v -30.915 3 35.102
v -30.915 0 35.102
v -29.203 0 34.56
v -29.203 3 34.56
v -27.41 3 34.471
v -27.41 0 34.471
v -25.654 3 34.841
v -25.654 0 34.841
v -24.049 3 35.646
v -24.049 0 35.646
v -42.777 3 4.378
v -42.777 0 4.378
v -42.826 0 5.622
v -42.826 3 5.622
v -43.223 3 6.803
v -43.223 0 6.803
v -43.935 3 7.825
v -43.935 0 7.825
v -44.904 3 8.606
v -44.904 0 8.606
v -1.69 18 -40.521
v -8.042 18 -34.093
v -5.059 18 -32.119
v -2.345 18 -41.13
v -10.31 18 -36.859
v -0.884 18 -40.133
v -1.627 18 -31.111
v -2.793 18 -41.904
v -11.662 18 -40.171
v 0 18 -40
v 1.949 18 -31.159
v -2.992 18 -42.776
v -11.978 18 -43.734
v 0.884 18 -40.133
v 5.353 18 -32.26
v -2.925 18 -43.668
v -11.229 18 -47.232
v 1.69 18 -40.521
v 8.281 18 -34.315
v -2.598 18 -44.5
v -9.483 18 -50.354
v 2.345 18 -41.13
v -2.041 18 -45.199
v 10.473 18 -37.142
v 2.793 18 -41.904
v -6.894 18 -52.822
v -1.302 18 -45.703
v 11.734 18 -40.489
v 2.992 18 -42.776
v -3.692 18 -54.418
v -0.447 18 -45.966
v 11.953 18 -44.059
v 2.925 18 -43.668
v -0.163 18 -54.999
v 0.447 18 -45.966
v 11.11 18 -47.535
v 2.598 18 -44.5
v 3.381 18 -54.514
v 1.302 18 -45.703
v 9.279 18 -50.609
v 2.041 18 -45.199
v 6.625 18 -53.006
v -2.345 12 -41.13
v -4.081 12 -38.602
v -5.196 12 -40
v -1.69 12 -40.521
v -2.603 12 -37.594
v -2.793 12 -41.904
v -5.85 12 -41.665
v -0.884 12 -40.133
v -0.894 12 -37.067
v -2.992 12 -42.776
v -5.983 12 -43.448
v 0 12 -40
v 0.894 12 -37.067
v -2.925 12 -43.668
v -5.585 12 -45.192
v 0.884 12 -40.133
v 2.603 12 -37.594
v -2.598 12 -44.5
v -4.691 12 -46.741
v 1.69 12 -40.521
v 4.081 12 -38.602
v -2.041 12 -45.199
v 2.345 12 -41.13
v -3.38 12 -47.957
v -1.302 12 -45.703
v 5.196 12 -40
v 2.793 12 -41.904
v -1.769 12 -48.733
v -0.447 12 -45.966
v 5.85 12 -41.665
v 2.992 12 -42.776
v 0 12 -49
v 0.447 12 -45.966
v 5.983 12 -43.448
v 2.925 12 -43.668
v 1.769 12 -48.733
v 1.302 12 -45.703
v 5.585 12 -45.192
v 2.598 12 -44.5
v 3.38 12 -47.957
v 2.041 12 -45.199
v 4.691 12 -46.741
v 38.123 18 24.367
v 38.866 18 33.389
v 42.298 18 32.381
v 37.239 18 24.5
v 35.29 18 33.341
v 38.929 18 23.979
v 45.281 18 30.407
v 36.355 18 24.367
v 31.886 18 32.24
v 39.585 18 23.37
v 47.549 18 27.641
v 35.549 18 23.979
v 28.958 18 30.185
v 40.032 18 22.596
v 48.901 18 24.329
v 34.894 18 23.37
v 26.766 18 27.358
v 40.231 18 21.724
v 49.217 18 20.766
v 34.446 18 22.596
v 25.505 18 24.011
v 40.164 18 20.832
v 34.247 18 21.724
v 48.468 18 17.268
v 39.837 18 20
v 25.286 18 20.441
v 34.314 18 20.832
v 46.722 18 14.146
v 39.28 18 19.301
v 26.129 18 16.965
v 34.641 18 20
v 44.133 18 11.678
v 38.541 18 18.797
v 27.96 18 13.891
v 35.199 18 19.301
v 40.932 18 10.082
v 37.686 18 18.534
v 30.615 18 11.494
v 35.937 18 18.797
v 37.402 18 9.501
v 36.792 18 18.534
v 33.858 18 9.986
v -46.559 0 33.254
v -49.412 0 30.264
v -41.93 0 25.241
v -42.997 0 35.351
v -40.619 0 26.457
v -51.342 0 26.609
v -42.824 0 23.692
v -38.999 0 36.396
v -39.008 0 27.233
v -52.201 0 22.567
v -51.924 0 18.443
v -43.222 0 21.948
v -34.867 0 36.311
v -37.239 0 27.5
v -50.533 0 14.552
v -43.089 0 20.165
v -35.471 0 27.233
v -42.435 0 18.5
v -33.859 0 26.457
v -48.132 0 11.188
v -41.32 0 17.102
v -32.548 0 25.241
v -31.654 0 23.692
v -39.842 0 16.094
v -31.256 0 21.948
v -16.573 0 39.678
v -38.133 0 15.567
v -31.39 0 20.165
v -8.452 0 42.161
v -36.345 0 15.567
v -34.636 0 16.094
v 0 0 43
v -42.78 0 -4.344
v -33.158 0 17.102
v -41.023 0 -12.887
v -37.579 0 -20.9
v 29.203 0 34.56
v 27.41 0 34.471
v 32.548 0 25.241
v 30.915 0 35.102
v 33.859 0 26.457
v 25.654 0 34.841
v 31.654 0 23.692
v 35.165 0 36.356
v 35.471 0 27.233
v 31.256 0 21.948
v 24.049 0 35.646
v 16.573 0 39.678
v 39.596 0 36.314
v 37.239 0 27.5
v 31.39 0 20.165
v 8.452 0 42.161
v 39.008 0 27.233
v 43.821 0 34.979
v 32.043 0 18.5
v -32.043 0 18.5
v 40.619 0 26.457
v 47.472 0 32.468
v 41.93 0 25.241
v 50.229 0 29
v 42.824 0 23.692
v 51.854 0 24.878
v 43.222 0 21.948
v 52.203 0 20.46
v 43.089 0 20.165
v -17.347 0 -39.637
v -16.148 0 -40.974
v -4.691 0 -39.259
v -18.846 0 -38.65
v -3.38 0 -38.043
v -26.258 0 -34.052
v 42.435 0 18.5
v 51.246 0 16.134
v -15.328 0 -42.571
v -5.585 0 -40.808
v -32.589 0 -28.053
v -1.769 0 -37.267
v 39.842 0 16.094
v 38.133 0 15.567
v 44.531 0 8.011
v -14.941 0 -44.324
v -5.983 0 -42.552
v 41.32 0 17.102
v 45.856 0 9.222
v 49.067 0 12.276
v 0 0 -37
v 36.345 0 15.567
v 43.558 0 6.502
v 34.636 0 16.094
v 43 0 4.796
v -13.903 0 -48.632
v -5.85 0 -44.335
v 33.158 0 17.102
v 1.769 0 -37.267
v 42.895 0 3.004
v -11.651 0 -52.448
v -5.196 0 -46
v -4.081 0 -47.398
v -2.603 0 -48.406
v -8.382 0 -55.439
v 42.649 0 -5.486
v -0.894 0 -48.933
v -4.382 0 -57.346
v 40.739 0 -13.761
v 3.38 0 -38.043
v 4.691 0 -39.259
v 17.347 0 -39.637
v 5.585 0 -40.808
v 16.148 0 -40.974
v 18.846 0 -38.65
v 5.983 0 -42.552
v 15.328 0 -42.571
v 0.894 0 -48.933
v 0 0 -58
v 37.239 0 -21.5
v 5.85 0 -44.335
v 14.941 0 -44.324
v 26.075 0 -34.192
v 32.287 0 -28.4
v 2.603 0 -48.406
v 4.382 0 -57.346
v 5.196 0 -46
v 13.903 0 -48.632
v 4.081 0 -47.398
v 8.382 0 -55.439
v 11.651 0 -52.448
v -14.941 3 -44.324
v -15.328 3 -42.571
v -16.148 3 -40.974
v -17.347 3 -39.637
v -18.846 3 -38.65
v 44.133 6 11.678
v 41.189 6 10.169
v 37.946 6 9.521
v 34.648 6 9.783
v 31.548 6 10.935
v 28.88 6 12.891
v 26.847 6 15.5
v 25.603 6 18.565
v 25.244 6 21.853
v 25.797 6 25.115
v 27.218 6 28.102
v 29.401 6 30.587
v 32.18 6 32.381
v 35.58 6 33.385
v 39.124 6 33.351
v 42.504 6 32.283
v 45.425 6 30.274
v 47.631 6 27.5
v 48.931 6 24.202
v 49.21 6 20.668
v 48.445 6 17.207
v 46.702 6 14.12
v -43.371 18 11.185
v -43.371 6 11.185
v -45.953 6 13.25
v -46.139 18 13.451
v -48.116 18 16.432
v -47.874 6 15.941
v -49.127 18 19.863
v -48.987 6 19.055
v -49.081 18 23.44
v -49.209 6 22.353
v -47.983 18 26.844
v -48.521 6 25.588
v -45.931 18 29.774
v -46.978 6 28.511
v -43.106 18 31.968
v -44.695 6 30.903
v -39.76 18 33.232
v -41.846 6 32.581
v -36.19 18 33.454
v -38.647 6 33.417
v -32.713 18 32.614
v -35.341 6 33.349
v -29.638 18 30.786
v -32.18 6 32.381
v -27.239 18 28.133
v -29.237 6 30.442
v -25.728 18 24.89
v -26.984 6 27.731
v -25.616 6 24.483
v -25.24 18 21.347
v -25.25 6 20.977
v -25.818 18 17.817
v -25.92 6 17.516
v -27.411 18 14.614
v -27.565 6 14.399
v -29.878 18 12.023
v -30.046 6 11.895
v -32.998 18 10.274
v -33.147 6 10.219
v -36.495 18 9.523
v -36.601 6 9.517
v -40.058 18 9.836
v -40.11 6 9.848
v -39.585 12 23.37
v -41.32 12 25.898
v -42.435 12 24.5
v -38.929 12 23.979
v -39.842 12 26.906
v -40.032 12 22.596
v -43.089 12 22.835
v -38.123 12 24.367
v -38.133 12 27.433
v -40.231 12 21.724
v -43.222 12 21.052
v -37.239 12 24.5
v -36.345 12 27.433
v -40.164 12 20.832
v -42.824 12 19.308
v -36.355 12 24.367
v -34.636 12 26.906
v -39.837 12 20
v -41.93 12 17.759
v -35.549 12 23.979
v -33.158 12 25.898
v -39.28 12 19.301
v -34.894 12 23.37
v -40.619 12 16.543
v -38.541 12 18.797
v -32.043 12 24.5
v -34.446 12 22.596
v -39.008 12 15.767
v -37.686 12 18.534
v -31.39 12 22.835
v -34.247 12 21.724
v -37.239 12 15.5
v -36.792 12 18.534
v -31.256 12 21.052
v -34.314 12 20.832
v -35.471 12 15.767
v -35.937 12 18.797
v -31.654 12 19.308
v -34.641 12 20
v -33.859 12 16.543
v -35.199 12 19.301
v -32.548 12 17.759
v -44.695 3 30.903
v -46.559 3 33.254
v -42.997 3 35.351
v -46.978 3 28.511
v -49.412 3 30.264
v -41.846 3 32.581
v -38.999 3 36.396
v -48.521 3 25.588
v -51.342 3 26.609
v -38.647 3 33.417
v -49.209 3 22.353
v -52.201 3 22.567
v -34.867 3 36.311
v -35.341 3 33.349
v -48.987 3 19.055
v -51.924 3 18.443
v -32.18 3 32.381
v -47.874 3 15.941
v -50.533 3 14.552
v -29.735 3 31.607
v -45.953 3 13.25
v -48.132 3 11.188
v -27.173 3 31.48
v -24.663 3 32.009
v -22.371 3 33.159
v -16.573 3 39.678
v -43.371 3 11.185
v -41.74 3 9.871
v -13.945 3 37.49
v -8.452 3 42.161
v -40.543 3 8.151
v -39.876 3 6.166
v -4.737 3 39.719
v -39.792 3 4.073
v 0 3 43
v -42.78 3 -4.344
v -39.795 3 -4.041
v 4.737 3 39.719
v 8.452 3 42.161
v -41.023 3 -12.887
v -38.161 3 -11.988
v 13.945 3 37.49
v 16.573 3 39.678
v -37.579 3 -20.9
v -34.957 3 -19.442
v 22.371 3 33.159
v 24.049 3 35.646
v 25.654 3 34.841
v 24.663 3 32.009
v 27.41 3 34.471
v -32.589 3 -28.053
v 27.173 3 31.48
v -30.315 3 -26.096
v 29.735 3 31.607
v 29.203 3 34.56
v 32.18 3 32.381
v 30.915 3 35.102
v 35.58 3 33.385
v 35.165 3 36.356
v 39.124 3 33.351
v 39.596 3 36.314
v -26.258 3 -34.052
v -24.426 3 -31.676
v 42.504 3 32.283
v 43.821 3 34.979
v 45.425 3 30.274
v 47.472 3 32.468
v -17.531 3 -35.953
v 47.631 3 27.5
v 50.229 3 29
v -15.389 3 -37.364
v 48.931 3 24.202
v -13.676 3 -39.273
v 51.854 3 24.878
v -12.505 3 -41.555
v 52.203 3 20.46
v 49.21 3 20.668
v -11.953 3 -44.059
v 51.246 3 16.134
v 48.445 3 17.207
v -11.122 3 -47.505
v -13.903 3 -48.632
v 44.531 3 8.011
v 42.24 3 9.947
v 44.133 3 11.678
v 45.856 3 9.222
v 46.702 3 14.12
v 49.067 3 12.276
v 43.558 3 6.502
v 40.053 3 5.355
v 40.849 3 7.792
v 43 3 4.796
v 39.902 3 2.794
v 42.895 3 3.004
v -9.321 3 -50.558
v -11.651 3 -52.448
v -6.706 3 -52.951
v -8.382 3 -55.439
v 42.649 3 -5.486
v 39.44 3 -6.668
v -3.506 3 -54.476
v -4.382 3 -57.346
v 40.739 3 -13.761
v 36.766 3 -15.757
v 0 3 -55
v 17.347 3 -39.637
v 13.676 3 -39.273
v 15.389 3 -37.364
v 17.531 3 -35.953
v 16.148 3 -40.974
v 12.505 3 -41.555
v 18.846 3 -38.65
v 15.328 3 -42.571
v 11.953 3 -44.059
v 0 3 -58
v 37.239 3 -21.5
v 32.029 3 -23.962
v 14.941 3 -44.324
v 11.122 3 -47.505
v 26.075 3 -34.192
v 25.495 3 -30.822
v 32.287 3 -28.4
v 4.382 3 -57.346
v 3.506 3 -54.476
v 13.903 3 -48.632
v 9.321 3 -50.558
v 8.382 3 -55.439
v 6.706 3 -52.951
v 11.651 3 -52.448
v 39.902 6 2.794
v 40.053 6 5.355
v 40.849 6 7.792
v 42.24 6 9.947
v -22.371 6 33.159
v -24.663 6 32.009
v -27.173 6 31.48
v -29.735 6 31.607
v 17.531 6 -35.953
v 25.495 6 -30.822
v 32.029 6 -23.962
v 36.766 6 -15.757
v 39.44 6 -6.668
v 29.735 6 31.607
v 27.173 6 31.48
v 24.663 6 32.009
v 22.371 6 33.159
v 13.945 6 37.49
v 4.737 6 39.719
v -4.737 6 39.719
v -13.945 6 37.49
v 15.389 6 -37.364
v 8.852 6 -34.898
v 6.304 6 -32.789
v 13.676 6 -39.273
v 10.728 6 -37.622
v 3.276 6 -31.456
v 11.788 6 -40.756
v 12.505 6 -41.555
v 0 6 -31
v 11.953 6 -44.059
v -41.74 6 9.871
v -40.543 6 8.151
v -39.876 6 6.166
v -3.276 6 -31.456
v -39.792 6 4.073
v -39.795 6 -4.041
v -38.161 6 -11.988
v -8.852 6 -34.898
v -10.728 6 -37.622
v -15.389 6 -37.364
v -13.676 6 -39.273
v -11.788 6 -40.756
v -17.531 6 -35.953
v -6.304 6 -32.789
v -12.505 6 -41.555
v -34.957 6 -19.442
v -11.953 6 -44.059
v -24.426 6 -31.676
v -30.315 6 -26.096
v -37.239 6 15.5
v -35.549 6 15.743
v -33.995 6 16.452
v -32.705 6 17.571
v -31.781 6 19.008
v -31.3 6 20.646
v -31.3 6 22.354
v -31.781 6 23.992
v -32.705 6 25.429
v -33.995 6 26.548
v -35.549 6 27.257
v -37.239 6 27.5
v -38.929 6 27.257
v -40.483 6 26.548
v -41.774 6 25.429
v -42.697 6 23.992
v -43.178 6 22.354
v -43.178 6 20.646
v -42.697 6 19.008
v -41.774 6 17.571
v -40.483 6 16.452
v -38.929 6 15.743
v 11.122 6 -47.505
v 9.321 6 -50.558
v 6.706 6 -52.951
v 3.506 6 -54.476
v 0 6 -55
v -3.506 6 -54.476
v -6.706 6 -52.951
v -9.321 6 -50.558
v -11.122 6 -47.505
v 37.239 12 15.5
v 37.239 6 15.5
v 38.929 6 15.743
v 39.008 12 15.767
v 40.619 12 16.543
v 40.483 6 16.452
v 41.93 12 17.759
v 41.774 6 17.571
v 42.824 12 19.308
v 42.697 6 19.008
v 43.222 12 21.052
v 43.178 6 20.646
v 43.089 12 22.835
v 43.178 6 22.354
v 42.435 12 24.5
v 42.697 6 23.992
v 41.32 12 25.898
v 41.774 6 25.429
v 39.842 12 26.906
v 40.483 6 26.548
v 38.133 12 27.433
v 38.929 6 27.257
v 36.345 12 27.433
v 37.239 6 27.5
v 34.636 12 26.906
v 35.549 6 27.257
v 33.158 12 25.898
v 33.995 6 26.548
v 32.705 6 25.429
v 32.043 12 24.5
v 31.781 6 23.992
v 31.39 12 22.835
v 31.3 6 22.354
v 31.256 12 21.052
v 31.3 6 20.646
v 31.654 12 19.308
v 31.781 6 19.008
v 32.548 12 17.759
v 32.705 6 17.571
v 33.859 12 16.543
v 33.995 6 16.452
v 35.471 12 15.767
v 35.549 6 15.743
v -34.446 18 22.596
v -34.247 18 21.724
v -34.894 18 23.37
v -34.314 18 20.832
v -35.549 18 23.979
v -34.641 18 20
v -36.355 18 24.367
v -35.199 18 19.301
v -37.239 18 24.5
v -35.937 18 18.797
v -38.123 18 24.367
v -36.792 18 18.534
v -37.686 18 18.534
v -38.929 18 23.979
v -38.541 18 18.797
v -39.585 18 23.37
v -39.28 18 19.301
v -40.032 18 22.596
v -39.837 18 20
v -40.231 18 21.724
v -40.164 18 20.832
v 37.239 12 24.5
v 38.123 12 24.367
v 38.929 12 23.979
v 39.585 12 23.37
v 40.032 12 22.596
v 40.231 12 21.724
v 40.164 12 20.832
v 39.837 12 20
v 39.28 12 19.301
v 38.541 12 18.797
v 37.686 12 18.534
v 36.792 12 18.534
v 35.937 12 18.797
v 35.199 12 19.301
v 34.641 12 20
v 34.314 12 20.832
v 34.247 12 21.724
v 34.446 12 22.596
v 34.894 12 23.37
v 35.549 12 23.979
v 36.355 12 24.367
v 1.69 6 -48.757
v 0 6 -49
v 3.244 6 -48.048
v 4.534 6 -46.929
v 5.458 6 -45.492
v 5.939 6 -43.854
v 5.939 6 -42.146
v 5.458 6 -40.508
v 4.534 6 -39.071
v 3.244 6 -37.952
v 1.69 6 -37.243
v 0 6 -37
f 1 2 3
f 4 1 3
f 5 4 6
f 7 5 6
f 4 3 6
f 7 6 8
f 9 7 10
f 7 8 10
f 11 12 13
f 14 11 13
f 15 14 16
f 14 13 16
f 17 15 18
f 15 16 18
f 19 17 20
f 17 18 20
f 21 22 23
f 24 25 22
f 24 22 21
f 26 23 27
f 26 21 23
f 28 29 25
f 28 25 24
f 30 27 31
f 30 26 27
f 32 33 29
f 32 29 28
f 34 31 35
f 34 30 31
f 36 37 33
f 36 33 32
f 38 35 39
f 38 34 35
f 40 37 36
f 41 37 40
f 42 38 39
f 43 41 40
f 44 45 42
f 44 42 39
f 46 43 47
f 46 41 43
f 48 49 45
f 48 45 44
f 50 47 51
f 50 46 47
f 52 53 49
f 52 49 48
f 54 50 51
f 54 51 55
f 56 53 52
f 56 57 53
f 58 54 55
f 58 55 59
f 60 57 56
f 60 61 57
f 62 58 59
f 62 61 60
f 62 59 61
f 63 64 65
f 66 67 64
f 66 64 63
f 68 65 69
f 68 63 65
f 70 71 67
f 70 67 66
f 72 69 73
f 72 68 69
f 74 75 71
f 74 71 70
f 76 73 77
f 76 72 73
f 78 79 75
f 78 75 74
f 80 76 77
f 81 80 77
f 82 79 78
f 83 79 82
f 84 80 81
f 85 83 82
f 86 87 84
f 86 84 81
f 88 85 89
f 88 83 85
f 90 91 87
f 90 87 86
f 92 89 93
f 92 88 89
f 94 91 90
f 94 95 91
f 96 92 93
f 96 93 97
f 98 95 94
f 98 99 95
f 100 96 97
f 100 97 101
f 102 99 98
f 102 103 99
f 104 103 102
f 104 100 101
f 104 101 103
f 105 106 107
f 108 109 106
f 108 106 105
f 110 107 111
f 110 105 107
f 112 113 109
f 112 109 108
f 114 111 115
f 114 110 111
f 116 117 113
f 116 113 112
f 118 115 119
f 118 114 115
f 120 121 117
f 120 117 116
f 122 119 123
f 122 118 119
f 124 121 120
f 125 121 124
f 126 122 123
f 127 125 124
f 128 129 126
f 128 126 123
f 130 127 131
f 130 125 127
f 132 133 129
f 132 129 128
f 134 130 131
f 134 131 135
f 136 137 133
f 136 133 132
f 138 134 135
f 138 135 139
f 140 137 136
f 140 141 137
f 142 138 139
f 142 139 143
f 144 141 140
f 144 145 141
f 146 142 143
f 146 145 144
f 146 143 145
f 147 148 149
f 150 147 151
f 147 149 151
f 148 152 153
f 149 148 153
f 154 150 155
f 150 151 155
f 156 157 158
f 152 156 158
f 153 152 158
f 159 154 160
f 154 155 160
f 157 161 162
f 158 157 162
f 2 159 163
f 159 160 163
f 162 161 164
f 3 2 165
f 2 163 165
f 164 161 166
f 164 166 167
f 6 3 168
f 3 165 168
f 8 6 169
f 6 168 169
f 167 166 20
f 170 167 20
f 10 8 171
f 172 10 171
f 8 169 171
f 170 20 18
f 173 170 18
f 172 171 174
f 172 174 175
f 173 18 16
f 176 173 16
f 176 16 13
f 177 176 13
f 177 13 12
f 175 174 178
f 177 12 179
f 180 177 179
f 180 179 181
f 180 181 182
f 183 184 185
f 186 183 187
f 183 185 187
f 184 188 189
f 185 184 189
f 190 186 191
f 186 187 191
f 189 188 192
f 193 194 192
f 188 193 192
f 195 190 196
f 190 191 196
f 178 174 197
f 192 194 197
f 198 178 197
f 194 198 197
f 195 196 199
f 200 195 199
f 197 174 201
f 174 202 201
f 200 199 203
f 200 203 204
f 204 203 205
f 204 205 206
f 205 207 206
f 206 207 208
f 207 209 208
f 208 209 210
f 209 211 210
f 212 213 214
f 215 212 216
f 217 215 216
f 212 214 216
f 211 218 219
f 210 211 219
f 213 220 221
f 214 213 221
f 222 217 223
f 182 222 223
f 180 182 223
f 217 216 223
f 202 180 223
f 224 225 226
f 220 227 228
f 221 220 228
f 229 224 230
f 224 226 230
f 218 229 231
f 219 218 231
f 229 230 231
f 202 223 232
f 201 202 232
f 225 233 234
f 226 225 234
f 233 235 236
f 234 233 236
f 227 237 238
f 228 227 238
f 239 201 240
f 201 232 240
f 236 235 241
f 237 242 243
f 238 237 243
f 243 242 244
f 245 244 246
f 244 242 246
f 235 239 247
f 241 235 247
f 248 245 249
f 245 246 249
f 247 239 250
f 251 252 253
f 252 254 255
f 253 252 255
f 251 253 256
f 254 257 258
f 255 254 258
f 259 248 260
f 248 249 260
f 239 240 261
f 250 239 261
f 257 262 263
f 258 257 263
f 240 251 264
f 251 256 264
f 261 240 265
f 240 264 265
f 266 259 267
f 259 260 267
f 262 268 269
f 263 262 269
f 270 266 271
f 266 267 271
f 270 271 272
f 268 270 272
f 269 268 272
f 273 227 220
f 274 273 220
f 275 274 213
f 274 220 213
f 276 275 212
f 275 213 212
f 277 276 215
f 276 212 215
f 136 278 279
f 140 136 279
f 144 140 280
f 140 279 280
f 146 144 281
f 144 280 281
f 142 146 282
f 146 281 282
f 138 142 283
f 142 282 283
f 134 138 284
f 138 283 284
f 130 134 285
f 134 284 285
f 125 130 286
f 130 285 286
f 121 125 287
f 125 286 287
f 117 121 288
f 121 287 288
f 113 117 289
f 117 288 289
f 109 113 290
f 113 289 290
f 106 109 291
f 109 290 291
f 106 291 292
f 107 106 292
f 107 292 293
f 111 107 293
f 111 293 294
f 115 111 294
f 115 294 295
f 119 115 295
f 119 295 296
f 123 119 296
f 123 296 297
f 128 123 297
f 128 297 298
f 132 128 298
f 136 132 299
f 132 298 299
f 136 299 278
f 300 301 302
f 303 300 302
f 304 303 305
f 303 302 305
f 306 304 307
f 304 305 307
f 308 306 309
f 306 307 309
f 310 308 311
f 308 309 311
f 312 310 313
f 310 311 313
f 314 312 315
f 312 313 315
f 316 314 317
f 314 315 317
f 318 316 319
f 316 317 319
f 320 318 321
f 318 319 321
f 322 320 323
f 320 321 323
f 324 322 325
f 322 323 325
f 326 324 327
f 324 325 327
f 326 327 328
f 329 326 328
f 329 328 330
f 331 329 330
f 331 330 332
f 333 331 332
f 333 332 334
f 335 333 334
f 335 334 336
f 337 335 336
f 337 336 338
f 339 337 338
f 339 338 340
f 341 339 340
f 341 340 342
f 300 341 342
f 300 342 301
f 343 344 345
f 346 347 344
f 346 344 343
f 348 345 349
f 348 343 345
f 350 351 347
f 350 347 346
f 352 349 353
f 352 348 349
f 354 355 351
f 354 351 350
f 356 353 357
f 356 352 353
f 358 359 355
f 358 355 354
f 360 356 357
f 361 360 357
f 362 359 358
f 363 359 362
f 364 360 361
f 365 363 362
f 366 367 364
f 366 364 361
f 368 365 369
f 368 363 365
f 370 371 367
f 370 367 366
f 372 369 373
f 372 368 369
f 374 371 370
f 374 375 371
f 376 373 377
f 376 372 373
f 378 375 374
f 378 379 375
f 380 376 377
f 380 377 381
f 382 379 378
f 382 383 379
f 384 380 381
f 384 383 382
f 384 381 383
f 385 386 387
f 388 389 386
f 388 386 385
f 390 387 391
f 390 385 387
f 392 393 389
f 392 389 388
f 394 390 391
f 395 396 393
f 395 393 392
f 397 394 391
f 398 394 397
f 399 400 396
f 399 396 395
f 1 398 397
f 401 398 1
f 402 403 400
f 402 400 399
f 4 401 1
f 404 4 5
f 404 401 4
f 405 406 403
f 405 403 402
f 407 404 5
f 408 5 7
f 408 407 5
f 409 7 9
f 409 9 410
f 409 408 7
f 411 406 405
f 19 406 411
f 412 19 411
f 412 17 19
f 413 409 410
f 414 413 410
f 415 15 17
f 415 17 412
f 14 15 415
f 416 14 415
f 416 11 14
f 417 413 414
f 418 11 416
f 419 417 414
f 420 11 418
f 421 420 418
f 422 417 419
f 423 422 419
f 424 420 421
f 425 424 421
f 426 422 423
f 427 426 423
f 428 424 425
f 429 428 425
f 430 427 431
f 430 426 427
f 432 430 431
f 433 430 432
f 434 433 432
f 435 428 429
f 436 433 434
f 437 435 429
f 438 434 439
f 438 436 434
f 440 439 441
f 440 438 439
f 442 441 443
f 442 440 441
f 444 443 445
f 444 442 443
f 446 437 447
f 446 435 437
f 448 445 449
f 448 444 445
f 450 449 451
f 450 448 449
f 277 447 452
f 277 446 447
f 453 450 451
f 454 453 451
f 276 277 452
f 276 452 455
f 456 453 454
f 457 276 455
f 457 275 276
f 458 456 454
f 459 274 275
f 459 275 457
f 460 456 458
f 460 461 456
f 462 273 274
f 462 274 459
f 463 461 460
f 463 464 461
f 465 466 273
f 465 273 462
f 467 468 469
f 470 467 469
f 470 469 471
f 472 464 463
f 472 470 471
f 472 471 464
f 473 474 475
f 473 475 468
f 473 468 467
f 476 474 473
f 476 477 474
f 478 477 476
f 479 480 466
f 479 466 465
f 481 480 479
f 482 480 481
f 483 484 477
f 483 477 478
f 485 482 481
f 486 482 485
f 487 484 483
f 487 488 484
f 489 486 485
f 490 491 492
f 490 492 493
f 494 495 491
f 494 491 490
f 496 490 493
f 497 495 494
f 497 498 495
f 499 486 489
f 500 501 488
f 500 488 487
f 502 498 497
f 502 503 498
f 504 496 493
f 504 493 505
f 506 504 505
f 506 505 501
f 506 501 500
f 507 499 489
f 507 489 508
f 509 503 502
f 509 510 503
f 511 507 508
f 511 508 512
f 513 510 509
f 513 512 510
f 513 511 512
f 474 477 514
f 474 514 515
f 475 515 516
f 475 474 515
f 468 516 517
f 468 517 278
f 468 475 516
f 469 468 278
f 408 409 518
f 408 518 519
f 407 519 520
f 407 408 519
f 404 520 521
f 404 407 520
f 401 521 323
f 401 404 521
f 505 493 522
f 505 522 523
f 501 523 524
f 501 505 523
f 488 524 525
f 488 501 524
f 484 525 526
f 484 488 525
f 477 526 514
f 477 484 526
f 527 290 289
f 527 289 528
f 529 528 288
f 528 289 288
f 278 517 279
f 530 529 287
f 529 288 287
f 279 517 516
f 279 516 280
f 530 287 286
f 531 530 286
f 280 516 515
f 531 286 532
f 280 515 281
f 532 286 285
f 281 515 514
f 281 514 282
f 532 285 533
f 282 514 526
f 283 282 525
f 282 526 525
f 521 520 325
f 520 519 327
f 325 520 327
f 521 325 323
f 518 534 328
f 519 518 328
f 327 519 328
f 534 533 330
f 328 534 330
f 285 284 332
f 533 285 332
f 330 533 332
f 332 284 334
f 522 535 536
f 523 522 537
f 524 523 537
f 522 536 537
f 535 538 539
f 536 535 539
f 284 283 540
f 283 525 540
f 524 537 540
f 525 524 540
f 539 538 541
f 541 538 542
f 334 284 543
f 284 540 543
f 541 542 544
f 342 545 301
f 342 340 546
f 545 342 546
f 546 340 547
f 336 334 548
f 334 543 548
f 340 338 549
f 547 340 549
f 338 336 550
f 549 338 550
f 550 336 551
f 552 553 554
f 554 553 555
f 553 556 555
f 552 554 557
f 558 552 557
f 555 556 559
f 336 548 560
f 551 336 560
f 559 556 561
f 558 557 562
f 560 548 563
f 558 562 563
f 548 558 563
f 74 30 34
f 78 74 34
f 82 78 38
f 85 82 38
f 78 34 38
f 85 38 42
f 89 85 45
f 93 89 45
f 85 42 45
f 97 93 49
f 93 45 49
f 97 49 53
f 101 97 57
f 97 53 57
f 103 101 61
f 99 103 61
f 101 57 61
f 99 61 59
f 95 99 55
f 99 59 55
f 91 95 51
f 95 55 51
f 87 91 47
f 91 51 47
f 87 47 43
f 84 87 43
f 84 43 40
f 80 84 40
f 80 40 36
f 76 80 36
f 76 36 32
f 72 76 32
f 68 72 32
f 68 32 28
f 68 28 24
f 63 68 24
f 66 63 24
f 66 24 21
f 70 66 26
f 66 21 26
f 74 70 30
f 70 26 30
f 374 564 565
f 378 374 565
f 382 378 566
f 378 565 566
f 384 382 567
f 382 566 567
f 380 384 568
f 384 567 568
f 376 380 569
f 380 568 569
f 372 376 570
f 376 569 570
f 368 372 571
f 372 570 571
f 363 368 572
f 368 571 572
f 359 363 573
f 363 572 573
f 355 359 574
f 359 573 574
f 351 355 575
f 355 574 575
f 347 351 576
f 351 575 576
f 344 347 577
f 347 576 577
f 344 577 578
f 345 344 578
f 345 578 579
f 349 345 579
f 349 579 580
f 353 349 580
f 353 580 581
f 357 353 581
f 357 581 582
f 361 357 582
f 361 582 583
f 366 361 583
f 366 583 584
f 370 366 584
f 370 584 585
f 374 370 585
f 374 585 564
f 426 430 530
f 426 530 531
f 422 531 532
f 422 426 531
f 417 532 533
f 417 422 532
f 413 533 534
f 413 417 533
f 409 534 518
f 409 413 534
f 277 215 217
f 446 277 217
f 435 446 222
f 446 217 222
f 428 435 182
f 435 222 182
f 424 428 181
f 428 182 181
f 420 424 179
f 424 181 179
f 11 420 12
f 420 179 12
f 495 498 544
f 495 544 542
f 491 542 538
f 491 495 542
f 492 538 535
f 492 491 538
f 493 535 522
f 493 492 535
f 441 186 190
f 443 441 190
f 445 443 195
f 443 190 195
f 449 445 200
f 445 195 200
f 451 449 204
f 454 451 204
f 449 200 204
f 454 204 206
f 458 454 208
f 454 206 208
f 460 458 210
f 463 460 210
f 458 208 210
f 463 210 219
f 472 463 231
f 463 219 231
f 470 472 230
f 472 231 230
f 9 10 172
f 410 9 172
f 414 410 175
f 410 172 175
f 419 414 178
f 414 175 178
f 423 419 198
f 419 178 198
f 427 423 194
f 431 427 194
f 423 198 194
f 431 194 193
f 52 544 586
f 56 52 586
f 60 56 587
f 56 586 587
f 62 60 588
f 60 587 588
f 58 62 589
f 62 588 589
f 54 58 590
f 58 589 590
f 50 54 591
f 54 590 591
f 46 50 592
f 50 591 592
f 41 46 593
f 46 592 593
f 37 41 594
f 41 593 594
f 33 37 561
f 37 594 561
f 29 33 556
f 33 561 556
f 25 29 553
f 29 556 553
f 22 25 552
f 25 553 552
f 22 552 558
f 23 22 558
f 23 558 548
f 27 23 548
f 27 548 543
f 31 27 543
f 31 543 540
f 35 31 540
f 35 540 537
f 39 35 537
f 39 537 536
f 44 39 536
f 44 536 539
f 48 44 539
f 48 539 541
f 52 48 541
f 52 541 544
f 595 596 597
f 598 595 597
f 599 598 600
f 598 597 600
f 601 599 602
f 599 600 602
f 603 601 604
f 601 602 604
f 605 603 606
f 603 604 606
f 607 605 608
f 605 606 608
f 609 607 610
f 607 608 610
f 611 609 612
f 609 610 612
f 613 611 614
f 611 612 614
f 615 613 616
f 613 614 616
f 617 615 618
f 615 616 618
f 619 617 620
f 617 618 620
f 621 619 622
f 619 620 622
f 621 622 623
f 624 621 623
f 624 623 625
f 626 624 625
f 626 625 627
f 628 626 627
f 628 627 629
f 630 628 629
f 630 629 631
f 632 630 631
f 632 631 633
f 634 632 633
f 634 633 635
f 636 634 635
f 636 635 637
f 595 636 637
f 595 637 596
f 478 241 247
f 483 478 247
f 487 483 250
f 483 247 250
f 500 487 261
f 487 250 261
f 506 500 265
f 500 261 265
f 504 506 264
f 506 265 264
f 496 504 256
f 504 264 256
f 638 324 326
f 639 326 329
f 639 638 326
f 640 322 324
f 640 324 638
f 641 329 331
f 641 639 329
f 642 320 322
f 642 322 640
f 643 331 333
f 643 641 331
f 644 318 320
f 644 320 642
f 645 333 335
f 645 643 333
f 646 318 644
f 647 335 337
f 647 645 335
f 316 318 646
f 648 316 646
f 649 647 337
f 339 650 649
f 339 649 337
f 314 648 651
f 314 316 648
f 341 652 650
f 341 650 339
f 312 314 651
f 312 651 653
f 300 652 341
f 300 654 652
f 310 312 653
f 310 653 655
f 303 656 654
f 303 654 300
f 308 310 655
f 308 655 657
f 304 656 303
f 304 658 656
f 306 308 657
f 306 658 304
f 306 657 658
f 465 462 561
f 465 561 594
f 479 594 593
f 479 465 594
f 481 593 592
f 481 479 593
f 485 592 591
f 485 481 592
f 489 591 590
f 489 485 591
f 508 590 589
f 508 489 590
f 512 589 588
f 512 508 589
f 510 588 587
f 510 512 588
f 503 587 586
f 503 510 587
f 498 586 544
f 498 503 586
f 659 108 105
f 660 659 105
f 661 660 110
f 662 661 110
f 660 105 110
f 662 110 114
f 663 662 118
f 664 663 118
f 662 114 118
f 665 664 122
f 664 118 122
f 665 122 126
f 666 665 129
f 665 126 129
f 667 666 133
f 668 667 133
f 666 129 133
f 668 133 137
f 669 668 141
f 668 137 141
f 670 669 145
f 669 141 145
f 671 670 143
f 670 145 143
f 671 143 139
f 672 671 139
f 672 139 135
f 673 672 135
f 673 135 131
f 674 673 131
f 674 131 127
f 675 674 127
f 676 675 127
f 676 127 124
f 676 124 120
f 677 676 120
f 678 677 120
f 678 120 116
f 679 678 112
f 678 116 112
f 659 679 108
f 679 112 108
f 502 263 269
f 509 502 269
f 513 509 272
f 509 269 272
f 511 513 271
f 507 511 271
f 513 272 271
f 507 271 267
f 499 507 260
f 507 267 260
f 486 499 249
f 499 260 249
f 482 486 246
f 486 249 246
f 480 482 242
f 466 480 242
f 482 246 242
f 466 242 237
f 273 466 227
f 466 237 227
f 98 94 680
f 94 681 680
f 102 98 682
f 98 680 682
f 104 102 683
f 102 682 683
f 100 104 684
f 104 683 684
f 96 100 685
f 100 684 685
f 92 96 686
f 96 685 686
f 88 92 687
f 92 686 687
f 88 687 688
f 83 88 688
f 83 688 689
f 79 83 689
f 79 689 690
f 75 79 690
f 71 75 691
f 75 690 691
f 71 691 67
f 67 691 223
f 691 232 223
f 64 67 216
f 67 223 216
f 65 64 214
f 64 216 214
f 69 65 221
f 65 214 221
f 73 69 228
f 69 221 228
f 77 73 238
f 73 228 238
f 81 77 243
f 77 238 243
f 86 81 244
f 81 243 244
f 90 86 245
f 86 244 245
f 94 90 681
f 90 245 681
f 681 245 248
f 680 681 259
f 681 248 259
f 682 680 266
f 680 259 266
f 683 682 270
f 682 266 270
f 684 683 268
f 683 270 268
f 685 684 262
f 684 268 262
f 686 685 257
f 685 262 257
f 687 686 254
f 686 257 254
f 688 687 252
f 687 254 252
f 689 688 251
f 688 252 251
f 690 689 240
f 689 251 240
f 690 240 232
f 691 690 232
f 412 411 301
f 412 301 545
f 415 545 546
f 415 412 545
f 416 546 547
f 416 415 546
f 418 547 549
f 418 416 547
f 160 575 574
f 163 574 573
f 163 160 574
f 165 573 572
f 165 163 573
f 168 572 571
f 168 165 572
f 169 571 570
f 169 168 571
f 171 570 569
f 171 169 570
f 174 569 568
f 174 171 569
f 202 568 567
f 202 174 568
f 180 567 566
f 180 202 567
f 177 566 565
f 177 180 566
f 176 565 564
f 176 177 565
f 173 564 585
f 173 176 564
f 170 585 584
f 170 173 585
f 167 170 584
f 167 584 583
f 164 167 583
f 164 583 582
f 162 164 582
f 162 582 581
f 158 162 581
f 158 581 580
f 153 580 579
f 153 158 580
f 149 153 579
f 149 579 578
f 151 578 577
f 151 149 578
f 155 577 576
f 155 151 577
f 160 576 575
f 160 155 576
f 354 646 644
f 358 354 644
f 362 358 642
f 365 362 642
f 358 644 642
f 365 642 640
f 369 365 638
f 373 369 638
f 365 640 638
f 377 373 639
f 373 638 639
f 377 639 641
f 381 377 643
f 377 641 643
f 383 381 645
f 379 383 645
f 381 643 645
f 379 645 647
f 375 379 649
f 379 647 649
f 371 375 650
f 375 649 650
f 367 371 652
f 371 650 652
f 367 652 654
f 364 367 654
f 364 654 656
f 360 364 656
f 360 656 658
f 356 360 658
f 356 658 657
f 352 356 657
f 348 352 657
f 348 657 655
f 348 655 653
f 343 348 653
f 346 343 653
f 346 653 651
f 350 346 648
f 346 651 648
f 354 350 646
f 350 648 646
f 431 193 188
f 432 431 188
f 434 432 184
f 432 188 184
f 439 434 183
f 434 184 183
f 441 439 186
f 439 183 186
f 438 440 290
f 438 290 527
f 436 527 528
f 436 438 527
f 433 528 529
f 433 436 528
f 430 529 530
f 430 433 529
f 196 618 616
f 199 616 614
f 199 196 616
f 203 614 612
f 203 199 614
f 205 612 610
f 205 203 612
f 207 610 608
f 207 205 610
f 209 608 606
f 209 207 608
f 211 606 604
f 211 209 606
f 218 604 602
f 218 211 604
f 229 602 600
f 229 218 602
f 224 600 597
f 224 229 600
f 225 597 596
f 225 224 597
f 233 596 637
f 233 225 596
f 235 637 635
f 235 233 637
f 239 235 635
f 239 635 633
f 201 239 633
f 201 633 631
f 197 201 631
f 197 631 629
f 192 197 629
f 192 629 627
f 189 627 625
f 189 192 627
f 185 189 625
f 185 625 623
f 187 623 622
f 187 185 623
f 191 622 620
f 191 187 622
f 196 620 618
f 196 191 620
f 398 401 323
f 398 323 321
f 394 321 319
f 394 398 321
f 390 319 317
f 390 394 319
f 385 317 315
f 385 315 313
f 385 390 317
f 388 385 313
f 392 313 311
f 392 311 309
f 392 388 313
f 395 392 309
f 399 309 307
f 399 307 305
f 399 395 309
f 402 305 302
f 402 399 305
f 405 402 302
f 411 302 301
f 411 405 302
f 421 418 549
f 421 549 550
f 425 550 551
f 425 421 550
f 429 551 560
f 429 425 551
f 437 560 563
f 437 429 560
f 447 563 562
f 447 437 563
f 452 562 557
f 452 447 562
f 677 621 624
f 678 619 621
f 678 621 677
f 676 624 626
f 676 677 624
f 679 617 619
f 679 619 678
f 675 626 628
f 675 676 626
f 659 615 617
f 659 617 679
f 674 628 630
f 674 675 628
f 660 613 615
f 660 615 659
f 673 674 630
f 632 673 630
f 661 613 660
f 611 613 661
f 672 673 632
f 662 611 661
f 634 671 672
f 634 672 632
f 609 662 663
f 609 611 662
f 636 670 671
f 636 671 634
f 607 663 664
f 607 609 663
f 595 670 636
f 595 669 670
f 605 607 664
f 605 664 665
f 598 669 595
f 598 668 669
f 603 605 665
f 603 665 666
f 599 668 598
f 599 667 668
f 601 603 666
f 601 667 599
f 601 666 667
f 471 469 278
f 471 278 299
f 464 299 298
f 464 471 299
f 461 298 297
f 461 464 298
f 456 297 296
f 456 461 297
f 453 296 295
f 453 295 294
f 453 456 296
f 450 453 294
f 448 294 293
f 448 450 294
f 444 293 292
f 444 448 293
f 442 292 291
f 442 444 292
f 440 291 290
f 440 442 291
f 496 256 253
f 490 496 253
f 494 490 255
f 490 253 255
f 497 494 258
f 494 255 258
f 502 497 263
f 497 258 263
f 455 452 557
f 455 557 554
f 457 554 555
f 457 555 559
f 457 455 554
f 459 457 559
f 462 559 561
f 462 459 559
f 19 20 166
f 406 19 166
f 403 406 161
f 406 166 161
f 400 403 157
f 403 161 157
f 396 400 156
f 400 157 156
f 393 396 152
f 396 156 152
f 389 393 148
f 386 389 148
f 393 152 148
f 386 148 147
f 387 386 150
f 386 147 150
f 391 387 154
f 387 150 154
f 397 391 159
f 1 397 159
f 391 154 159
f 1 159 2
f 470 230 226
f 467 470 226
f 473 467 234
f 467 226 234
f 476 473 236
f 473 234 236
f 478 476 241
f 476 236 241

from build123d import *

# Parameters (mm, degrees)
SZKIC1_R                    = 6
DODANIE_WYCI_GNI_CIE3_DEPTH = 3
SZKIC2_R                    = 6
DODANIE_WYCI_GNI_CIE5_DEPTH = 3
SZKIC3_R                    = 12
DODANIE_WYCI_GNI_CIE7_DEPTH = 12
SZKIC4_R                    = 3
WYTNIJ_WYCI_GNI_CIE1_DEPTH  = 6
SZKIC5_R                    = 6
WYTNIJ_WYCI_GNI_CIE2_DEPTH  = 6


with BuildPart() as part:
    # Szkic1 → Dodanie-wyciągnięcie3 (new body)
    with BuildSketch(Plane(origin=(0, 0, 0), x_dir=(1, 0, 0), z_dir=(0, 1, 0))):
        with BuildLine():
            ThreePointArc((18.846153454, 38.65), (16.147655157, 40.973517523), (14.941453584, 44.323995772))
            ThreePointArc((14.941453584, 44.323995772), (0, 58), (-14.941453584, 44.323995772))
            ThreePointArc((-14.941453584, 44.323995772), (-16.147655157, 40.973517523), (-18.846153454, 38.65))
            ThreePointArc((-18.846153454, 38.65), (-37.579169087, 20.89990552), (-42.776535296, -4.378130663))
            ThreePointArc((-42.776535296, -4.378130663), (-43.223069571, -6.802925196), (-44.904285151, -8.606403934))
            ThreePointArc((-44.904285151, -8.606403934), (-50.503687636, -28.503607088), (-30.914979544, -35.101676259))
            ThreePointArc((-30.914979544, -35.101676259), (-27.410279478, -34.471038339), (-24.048805129, -35.646247655))
            ThreePointArc((-24.048805129, -35.646247655), (0, -43), (24.048805129, -35.646247655))
            ThreePointArc((24.048805129, -35.646247655), (27.410279478, -34.471038339), (30.914979544, -35.101676259))
            ThreePointArc((30.914979544, -35.101676259), (50.229473419, -29), (45.856433127, -9.222319513))
            ThreePointArc((45.856433127, -9.222319513), (43.557934635, -6.502479184), (42.894958583, -3.003752345))
            ThreePointArc((42.894958583, -3.003752345), (37.239092363, 21.5), (18.846153454, 38.65))
        make_face()
        with Locations(Location((0, 43, 0), (0, 0, 270))):
            Circle(SZKIC1_R, mode=Mode.SUBTRACT)
        with Locations(Location((37.239092363, -21.5, 0), (0, 0, 270))):
            Circle(SZKIC1_R, mode=Mode.SUBTRACT)
        with Locations(Location((-37.239092363, -21.5, 0), (0, 0, 270))):
            Circle(SZKIC1_R, mode=Mode.SUBTRACT)
    extrude(amount=DODANIE_WYCI_GNI_CIE3_DEPTH)

    # Szkic2 → Dodanie-wyciągnięcie5 (add)
    with BuildSketch(Plane(origin=(0, 3, 0), x_dir=(1, 0, 0), z_dir=(0, 1, 0))):
        with BuildLine():
            ThreePointArc((32.179802107, -32.381341007), (27.173087728, -31.480429693), (22.370981516, -33.159300144))
            ThreePointArc((22.370981516, -33.159300144), (0, -40), (-22.370981516, -33.159300144))
            ThreePointArc((-22.370981516, -33.159300144), (-27.173087728, -31.480429693), (-32.179802107, -32.381341007))
            ThreePointArc((-32.179802107, -32.381341007), (-47.850768581, -27.10288567), (-43.371246594, -11.185123147))
            ThreePointArc((-43.371246594, -11.185123147), (-40.543248024, -8.151463841), (-39.792125856, -4.072679686))
            ThreePointArc((-39.792125856, -4.072679686), (-34.957366592, 19.441772577), (-17.531305538, 35.953488372))
            ThreePointArc((-17.531305538, 35.953488372), (-13.676307972, 39.272799119), (-11.953162867, 44.059196617))
            ThreePointArc((-11.953162867, 44.059196617), (0, 55), (11.953162867, 44.059196617))
            ThreePointArc((11.953162867, 44.059196617), (13.676307972, 39.272799119), (17.531305538, 35.953488372))
            ThreePointArc((17.531305538, 35.953488372), (34.641016151, 20), (39.902287054, -2.794188228))
            ThreePointArc((39.902287054, -2.794188228), (40.8493957, -7.792369426), (44.132964974, -11.67785561))
            ThreePointArc((44.132964974, -11.67785561), (47.631397208, -27.5), (32.179802107, -32.381341007))
        make_face()
        with Locations(Location((37.239092363, -21.5, 0), (0, 0, 270))):
            Circle(SZKIC2_R, mode=Mode.SUBTRACT)
        with Locations(Location((0, 43, 0), (0, 0, 270))):
            Circle(SZKIC2_R, mode=Mode.SUBTRACT)
        with Locations(Location((-37.239092363, -21.5, 0), (0, 0, 270))):
            Circle(SZKIC2_R, mode=Mode.SUBTRACT)
    extrude(amount=DODANIE_WYCI_GNI_CIE5_DEPTH)

    # Szkic3 → Dodanie-wyciągnięcie7 (add)
    with BuildSketch(Plane(origin=(0, 6, 0), x_dir=(1, 0, 0), z_dir=(0, 1, 0))):
        with Locations(Location((0, 43, 0), (0, 0, 5.063881306))):
            Circle(SZKIC3_R)
        with Locations(Location((37.239092363, -21.5, 0), (0, 0, 54.936118694))):
            Circle(SZKIC3_R)
        with Locations(Location((-37.239092363, -21.5, 0), (0, 0, 120.73131892))):
            Circle(SZKIC3_R)
    extrude(amount=DODANIE_WYCI_GNI_CIE7_DEPTH)

    # Szkic4 → Wytnij-wyciągnięcie1 (cut)
    with BuildSketch(Plane(origin=(0, 18, 0), x_dir=(1, 0, 0), z_dir=(0, 1, 0))):
        with Locations(Location((0, 43, 0), (0, 0, 270))):
            Circle(SZKIC4_R)
        with Locations(Location((37.239092363, -21.5, 0), (0, 0, 270))):
            Circle(SZKIC4_R)
        with Locations(Location((-37.239092363, -21.5, 0), (0, 0, 270))):
            Circle(SZKIC4_R)
    extrude(amount=-WYTNIJ_WYCI_GNI_CIE1_DEPTH, mode=Mode.SUBTRACT)

    # Szkic5 → Wytnij-wyciągnięcie2 (cut)
    with BuildSketch(Plane.XZ.offset(-6)):
        with Locations(Location((37.239092363, 21.5, 0), (0, 0, 270))):
            Circle(SZKIC5_R)
        with Locations(Location((0, -43, 0), (0, 0, 270))):
            Circle(SZKIC5_R)
        with Locations(Location((-37.239092363, 21.5, 0), (0, 0, 270))):
            Circle(SZKIC5_R)
    extrude(amount=-WYTNIJ_WYCI_GNI_CIE2_DEPTH, mode=Mode.SUBTRACT)


solid = part.part
